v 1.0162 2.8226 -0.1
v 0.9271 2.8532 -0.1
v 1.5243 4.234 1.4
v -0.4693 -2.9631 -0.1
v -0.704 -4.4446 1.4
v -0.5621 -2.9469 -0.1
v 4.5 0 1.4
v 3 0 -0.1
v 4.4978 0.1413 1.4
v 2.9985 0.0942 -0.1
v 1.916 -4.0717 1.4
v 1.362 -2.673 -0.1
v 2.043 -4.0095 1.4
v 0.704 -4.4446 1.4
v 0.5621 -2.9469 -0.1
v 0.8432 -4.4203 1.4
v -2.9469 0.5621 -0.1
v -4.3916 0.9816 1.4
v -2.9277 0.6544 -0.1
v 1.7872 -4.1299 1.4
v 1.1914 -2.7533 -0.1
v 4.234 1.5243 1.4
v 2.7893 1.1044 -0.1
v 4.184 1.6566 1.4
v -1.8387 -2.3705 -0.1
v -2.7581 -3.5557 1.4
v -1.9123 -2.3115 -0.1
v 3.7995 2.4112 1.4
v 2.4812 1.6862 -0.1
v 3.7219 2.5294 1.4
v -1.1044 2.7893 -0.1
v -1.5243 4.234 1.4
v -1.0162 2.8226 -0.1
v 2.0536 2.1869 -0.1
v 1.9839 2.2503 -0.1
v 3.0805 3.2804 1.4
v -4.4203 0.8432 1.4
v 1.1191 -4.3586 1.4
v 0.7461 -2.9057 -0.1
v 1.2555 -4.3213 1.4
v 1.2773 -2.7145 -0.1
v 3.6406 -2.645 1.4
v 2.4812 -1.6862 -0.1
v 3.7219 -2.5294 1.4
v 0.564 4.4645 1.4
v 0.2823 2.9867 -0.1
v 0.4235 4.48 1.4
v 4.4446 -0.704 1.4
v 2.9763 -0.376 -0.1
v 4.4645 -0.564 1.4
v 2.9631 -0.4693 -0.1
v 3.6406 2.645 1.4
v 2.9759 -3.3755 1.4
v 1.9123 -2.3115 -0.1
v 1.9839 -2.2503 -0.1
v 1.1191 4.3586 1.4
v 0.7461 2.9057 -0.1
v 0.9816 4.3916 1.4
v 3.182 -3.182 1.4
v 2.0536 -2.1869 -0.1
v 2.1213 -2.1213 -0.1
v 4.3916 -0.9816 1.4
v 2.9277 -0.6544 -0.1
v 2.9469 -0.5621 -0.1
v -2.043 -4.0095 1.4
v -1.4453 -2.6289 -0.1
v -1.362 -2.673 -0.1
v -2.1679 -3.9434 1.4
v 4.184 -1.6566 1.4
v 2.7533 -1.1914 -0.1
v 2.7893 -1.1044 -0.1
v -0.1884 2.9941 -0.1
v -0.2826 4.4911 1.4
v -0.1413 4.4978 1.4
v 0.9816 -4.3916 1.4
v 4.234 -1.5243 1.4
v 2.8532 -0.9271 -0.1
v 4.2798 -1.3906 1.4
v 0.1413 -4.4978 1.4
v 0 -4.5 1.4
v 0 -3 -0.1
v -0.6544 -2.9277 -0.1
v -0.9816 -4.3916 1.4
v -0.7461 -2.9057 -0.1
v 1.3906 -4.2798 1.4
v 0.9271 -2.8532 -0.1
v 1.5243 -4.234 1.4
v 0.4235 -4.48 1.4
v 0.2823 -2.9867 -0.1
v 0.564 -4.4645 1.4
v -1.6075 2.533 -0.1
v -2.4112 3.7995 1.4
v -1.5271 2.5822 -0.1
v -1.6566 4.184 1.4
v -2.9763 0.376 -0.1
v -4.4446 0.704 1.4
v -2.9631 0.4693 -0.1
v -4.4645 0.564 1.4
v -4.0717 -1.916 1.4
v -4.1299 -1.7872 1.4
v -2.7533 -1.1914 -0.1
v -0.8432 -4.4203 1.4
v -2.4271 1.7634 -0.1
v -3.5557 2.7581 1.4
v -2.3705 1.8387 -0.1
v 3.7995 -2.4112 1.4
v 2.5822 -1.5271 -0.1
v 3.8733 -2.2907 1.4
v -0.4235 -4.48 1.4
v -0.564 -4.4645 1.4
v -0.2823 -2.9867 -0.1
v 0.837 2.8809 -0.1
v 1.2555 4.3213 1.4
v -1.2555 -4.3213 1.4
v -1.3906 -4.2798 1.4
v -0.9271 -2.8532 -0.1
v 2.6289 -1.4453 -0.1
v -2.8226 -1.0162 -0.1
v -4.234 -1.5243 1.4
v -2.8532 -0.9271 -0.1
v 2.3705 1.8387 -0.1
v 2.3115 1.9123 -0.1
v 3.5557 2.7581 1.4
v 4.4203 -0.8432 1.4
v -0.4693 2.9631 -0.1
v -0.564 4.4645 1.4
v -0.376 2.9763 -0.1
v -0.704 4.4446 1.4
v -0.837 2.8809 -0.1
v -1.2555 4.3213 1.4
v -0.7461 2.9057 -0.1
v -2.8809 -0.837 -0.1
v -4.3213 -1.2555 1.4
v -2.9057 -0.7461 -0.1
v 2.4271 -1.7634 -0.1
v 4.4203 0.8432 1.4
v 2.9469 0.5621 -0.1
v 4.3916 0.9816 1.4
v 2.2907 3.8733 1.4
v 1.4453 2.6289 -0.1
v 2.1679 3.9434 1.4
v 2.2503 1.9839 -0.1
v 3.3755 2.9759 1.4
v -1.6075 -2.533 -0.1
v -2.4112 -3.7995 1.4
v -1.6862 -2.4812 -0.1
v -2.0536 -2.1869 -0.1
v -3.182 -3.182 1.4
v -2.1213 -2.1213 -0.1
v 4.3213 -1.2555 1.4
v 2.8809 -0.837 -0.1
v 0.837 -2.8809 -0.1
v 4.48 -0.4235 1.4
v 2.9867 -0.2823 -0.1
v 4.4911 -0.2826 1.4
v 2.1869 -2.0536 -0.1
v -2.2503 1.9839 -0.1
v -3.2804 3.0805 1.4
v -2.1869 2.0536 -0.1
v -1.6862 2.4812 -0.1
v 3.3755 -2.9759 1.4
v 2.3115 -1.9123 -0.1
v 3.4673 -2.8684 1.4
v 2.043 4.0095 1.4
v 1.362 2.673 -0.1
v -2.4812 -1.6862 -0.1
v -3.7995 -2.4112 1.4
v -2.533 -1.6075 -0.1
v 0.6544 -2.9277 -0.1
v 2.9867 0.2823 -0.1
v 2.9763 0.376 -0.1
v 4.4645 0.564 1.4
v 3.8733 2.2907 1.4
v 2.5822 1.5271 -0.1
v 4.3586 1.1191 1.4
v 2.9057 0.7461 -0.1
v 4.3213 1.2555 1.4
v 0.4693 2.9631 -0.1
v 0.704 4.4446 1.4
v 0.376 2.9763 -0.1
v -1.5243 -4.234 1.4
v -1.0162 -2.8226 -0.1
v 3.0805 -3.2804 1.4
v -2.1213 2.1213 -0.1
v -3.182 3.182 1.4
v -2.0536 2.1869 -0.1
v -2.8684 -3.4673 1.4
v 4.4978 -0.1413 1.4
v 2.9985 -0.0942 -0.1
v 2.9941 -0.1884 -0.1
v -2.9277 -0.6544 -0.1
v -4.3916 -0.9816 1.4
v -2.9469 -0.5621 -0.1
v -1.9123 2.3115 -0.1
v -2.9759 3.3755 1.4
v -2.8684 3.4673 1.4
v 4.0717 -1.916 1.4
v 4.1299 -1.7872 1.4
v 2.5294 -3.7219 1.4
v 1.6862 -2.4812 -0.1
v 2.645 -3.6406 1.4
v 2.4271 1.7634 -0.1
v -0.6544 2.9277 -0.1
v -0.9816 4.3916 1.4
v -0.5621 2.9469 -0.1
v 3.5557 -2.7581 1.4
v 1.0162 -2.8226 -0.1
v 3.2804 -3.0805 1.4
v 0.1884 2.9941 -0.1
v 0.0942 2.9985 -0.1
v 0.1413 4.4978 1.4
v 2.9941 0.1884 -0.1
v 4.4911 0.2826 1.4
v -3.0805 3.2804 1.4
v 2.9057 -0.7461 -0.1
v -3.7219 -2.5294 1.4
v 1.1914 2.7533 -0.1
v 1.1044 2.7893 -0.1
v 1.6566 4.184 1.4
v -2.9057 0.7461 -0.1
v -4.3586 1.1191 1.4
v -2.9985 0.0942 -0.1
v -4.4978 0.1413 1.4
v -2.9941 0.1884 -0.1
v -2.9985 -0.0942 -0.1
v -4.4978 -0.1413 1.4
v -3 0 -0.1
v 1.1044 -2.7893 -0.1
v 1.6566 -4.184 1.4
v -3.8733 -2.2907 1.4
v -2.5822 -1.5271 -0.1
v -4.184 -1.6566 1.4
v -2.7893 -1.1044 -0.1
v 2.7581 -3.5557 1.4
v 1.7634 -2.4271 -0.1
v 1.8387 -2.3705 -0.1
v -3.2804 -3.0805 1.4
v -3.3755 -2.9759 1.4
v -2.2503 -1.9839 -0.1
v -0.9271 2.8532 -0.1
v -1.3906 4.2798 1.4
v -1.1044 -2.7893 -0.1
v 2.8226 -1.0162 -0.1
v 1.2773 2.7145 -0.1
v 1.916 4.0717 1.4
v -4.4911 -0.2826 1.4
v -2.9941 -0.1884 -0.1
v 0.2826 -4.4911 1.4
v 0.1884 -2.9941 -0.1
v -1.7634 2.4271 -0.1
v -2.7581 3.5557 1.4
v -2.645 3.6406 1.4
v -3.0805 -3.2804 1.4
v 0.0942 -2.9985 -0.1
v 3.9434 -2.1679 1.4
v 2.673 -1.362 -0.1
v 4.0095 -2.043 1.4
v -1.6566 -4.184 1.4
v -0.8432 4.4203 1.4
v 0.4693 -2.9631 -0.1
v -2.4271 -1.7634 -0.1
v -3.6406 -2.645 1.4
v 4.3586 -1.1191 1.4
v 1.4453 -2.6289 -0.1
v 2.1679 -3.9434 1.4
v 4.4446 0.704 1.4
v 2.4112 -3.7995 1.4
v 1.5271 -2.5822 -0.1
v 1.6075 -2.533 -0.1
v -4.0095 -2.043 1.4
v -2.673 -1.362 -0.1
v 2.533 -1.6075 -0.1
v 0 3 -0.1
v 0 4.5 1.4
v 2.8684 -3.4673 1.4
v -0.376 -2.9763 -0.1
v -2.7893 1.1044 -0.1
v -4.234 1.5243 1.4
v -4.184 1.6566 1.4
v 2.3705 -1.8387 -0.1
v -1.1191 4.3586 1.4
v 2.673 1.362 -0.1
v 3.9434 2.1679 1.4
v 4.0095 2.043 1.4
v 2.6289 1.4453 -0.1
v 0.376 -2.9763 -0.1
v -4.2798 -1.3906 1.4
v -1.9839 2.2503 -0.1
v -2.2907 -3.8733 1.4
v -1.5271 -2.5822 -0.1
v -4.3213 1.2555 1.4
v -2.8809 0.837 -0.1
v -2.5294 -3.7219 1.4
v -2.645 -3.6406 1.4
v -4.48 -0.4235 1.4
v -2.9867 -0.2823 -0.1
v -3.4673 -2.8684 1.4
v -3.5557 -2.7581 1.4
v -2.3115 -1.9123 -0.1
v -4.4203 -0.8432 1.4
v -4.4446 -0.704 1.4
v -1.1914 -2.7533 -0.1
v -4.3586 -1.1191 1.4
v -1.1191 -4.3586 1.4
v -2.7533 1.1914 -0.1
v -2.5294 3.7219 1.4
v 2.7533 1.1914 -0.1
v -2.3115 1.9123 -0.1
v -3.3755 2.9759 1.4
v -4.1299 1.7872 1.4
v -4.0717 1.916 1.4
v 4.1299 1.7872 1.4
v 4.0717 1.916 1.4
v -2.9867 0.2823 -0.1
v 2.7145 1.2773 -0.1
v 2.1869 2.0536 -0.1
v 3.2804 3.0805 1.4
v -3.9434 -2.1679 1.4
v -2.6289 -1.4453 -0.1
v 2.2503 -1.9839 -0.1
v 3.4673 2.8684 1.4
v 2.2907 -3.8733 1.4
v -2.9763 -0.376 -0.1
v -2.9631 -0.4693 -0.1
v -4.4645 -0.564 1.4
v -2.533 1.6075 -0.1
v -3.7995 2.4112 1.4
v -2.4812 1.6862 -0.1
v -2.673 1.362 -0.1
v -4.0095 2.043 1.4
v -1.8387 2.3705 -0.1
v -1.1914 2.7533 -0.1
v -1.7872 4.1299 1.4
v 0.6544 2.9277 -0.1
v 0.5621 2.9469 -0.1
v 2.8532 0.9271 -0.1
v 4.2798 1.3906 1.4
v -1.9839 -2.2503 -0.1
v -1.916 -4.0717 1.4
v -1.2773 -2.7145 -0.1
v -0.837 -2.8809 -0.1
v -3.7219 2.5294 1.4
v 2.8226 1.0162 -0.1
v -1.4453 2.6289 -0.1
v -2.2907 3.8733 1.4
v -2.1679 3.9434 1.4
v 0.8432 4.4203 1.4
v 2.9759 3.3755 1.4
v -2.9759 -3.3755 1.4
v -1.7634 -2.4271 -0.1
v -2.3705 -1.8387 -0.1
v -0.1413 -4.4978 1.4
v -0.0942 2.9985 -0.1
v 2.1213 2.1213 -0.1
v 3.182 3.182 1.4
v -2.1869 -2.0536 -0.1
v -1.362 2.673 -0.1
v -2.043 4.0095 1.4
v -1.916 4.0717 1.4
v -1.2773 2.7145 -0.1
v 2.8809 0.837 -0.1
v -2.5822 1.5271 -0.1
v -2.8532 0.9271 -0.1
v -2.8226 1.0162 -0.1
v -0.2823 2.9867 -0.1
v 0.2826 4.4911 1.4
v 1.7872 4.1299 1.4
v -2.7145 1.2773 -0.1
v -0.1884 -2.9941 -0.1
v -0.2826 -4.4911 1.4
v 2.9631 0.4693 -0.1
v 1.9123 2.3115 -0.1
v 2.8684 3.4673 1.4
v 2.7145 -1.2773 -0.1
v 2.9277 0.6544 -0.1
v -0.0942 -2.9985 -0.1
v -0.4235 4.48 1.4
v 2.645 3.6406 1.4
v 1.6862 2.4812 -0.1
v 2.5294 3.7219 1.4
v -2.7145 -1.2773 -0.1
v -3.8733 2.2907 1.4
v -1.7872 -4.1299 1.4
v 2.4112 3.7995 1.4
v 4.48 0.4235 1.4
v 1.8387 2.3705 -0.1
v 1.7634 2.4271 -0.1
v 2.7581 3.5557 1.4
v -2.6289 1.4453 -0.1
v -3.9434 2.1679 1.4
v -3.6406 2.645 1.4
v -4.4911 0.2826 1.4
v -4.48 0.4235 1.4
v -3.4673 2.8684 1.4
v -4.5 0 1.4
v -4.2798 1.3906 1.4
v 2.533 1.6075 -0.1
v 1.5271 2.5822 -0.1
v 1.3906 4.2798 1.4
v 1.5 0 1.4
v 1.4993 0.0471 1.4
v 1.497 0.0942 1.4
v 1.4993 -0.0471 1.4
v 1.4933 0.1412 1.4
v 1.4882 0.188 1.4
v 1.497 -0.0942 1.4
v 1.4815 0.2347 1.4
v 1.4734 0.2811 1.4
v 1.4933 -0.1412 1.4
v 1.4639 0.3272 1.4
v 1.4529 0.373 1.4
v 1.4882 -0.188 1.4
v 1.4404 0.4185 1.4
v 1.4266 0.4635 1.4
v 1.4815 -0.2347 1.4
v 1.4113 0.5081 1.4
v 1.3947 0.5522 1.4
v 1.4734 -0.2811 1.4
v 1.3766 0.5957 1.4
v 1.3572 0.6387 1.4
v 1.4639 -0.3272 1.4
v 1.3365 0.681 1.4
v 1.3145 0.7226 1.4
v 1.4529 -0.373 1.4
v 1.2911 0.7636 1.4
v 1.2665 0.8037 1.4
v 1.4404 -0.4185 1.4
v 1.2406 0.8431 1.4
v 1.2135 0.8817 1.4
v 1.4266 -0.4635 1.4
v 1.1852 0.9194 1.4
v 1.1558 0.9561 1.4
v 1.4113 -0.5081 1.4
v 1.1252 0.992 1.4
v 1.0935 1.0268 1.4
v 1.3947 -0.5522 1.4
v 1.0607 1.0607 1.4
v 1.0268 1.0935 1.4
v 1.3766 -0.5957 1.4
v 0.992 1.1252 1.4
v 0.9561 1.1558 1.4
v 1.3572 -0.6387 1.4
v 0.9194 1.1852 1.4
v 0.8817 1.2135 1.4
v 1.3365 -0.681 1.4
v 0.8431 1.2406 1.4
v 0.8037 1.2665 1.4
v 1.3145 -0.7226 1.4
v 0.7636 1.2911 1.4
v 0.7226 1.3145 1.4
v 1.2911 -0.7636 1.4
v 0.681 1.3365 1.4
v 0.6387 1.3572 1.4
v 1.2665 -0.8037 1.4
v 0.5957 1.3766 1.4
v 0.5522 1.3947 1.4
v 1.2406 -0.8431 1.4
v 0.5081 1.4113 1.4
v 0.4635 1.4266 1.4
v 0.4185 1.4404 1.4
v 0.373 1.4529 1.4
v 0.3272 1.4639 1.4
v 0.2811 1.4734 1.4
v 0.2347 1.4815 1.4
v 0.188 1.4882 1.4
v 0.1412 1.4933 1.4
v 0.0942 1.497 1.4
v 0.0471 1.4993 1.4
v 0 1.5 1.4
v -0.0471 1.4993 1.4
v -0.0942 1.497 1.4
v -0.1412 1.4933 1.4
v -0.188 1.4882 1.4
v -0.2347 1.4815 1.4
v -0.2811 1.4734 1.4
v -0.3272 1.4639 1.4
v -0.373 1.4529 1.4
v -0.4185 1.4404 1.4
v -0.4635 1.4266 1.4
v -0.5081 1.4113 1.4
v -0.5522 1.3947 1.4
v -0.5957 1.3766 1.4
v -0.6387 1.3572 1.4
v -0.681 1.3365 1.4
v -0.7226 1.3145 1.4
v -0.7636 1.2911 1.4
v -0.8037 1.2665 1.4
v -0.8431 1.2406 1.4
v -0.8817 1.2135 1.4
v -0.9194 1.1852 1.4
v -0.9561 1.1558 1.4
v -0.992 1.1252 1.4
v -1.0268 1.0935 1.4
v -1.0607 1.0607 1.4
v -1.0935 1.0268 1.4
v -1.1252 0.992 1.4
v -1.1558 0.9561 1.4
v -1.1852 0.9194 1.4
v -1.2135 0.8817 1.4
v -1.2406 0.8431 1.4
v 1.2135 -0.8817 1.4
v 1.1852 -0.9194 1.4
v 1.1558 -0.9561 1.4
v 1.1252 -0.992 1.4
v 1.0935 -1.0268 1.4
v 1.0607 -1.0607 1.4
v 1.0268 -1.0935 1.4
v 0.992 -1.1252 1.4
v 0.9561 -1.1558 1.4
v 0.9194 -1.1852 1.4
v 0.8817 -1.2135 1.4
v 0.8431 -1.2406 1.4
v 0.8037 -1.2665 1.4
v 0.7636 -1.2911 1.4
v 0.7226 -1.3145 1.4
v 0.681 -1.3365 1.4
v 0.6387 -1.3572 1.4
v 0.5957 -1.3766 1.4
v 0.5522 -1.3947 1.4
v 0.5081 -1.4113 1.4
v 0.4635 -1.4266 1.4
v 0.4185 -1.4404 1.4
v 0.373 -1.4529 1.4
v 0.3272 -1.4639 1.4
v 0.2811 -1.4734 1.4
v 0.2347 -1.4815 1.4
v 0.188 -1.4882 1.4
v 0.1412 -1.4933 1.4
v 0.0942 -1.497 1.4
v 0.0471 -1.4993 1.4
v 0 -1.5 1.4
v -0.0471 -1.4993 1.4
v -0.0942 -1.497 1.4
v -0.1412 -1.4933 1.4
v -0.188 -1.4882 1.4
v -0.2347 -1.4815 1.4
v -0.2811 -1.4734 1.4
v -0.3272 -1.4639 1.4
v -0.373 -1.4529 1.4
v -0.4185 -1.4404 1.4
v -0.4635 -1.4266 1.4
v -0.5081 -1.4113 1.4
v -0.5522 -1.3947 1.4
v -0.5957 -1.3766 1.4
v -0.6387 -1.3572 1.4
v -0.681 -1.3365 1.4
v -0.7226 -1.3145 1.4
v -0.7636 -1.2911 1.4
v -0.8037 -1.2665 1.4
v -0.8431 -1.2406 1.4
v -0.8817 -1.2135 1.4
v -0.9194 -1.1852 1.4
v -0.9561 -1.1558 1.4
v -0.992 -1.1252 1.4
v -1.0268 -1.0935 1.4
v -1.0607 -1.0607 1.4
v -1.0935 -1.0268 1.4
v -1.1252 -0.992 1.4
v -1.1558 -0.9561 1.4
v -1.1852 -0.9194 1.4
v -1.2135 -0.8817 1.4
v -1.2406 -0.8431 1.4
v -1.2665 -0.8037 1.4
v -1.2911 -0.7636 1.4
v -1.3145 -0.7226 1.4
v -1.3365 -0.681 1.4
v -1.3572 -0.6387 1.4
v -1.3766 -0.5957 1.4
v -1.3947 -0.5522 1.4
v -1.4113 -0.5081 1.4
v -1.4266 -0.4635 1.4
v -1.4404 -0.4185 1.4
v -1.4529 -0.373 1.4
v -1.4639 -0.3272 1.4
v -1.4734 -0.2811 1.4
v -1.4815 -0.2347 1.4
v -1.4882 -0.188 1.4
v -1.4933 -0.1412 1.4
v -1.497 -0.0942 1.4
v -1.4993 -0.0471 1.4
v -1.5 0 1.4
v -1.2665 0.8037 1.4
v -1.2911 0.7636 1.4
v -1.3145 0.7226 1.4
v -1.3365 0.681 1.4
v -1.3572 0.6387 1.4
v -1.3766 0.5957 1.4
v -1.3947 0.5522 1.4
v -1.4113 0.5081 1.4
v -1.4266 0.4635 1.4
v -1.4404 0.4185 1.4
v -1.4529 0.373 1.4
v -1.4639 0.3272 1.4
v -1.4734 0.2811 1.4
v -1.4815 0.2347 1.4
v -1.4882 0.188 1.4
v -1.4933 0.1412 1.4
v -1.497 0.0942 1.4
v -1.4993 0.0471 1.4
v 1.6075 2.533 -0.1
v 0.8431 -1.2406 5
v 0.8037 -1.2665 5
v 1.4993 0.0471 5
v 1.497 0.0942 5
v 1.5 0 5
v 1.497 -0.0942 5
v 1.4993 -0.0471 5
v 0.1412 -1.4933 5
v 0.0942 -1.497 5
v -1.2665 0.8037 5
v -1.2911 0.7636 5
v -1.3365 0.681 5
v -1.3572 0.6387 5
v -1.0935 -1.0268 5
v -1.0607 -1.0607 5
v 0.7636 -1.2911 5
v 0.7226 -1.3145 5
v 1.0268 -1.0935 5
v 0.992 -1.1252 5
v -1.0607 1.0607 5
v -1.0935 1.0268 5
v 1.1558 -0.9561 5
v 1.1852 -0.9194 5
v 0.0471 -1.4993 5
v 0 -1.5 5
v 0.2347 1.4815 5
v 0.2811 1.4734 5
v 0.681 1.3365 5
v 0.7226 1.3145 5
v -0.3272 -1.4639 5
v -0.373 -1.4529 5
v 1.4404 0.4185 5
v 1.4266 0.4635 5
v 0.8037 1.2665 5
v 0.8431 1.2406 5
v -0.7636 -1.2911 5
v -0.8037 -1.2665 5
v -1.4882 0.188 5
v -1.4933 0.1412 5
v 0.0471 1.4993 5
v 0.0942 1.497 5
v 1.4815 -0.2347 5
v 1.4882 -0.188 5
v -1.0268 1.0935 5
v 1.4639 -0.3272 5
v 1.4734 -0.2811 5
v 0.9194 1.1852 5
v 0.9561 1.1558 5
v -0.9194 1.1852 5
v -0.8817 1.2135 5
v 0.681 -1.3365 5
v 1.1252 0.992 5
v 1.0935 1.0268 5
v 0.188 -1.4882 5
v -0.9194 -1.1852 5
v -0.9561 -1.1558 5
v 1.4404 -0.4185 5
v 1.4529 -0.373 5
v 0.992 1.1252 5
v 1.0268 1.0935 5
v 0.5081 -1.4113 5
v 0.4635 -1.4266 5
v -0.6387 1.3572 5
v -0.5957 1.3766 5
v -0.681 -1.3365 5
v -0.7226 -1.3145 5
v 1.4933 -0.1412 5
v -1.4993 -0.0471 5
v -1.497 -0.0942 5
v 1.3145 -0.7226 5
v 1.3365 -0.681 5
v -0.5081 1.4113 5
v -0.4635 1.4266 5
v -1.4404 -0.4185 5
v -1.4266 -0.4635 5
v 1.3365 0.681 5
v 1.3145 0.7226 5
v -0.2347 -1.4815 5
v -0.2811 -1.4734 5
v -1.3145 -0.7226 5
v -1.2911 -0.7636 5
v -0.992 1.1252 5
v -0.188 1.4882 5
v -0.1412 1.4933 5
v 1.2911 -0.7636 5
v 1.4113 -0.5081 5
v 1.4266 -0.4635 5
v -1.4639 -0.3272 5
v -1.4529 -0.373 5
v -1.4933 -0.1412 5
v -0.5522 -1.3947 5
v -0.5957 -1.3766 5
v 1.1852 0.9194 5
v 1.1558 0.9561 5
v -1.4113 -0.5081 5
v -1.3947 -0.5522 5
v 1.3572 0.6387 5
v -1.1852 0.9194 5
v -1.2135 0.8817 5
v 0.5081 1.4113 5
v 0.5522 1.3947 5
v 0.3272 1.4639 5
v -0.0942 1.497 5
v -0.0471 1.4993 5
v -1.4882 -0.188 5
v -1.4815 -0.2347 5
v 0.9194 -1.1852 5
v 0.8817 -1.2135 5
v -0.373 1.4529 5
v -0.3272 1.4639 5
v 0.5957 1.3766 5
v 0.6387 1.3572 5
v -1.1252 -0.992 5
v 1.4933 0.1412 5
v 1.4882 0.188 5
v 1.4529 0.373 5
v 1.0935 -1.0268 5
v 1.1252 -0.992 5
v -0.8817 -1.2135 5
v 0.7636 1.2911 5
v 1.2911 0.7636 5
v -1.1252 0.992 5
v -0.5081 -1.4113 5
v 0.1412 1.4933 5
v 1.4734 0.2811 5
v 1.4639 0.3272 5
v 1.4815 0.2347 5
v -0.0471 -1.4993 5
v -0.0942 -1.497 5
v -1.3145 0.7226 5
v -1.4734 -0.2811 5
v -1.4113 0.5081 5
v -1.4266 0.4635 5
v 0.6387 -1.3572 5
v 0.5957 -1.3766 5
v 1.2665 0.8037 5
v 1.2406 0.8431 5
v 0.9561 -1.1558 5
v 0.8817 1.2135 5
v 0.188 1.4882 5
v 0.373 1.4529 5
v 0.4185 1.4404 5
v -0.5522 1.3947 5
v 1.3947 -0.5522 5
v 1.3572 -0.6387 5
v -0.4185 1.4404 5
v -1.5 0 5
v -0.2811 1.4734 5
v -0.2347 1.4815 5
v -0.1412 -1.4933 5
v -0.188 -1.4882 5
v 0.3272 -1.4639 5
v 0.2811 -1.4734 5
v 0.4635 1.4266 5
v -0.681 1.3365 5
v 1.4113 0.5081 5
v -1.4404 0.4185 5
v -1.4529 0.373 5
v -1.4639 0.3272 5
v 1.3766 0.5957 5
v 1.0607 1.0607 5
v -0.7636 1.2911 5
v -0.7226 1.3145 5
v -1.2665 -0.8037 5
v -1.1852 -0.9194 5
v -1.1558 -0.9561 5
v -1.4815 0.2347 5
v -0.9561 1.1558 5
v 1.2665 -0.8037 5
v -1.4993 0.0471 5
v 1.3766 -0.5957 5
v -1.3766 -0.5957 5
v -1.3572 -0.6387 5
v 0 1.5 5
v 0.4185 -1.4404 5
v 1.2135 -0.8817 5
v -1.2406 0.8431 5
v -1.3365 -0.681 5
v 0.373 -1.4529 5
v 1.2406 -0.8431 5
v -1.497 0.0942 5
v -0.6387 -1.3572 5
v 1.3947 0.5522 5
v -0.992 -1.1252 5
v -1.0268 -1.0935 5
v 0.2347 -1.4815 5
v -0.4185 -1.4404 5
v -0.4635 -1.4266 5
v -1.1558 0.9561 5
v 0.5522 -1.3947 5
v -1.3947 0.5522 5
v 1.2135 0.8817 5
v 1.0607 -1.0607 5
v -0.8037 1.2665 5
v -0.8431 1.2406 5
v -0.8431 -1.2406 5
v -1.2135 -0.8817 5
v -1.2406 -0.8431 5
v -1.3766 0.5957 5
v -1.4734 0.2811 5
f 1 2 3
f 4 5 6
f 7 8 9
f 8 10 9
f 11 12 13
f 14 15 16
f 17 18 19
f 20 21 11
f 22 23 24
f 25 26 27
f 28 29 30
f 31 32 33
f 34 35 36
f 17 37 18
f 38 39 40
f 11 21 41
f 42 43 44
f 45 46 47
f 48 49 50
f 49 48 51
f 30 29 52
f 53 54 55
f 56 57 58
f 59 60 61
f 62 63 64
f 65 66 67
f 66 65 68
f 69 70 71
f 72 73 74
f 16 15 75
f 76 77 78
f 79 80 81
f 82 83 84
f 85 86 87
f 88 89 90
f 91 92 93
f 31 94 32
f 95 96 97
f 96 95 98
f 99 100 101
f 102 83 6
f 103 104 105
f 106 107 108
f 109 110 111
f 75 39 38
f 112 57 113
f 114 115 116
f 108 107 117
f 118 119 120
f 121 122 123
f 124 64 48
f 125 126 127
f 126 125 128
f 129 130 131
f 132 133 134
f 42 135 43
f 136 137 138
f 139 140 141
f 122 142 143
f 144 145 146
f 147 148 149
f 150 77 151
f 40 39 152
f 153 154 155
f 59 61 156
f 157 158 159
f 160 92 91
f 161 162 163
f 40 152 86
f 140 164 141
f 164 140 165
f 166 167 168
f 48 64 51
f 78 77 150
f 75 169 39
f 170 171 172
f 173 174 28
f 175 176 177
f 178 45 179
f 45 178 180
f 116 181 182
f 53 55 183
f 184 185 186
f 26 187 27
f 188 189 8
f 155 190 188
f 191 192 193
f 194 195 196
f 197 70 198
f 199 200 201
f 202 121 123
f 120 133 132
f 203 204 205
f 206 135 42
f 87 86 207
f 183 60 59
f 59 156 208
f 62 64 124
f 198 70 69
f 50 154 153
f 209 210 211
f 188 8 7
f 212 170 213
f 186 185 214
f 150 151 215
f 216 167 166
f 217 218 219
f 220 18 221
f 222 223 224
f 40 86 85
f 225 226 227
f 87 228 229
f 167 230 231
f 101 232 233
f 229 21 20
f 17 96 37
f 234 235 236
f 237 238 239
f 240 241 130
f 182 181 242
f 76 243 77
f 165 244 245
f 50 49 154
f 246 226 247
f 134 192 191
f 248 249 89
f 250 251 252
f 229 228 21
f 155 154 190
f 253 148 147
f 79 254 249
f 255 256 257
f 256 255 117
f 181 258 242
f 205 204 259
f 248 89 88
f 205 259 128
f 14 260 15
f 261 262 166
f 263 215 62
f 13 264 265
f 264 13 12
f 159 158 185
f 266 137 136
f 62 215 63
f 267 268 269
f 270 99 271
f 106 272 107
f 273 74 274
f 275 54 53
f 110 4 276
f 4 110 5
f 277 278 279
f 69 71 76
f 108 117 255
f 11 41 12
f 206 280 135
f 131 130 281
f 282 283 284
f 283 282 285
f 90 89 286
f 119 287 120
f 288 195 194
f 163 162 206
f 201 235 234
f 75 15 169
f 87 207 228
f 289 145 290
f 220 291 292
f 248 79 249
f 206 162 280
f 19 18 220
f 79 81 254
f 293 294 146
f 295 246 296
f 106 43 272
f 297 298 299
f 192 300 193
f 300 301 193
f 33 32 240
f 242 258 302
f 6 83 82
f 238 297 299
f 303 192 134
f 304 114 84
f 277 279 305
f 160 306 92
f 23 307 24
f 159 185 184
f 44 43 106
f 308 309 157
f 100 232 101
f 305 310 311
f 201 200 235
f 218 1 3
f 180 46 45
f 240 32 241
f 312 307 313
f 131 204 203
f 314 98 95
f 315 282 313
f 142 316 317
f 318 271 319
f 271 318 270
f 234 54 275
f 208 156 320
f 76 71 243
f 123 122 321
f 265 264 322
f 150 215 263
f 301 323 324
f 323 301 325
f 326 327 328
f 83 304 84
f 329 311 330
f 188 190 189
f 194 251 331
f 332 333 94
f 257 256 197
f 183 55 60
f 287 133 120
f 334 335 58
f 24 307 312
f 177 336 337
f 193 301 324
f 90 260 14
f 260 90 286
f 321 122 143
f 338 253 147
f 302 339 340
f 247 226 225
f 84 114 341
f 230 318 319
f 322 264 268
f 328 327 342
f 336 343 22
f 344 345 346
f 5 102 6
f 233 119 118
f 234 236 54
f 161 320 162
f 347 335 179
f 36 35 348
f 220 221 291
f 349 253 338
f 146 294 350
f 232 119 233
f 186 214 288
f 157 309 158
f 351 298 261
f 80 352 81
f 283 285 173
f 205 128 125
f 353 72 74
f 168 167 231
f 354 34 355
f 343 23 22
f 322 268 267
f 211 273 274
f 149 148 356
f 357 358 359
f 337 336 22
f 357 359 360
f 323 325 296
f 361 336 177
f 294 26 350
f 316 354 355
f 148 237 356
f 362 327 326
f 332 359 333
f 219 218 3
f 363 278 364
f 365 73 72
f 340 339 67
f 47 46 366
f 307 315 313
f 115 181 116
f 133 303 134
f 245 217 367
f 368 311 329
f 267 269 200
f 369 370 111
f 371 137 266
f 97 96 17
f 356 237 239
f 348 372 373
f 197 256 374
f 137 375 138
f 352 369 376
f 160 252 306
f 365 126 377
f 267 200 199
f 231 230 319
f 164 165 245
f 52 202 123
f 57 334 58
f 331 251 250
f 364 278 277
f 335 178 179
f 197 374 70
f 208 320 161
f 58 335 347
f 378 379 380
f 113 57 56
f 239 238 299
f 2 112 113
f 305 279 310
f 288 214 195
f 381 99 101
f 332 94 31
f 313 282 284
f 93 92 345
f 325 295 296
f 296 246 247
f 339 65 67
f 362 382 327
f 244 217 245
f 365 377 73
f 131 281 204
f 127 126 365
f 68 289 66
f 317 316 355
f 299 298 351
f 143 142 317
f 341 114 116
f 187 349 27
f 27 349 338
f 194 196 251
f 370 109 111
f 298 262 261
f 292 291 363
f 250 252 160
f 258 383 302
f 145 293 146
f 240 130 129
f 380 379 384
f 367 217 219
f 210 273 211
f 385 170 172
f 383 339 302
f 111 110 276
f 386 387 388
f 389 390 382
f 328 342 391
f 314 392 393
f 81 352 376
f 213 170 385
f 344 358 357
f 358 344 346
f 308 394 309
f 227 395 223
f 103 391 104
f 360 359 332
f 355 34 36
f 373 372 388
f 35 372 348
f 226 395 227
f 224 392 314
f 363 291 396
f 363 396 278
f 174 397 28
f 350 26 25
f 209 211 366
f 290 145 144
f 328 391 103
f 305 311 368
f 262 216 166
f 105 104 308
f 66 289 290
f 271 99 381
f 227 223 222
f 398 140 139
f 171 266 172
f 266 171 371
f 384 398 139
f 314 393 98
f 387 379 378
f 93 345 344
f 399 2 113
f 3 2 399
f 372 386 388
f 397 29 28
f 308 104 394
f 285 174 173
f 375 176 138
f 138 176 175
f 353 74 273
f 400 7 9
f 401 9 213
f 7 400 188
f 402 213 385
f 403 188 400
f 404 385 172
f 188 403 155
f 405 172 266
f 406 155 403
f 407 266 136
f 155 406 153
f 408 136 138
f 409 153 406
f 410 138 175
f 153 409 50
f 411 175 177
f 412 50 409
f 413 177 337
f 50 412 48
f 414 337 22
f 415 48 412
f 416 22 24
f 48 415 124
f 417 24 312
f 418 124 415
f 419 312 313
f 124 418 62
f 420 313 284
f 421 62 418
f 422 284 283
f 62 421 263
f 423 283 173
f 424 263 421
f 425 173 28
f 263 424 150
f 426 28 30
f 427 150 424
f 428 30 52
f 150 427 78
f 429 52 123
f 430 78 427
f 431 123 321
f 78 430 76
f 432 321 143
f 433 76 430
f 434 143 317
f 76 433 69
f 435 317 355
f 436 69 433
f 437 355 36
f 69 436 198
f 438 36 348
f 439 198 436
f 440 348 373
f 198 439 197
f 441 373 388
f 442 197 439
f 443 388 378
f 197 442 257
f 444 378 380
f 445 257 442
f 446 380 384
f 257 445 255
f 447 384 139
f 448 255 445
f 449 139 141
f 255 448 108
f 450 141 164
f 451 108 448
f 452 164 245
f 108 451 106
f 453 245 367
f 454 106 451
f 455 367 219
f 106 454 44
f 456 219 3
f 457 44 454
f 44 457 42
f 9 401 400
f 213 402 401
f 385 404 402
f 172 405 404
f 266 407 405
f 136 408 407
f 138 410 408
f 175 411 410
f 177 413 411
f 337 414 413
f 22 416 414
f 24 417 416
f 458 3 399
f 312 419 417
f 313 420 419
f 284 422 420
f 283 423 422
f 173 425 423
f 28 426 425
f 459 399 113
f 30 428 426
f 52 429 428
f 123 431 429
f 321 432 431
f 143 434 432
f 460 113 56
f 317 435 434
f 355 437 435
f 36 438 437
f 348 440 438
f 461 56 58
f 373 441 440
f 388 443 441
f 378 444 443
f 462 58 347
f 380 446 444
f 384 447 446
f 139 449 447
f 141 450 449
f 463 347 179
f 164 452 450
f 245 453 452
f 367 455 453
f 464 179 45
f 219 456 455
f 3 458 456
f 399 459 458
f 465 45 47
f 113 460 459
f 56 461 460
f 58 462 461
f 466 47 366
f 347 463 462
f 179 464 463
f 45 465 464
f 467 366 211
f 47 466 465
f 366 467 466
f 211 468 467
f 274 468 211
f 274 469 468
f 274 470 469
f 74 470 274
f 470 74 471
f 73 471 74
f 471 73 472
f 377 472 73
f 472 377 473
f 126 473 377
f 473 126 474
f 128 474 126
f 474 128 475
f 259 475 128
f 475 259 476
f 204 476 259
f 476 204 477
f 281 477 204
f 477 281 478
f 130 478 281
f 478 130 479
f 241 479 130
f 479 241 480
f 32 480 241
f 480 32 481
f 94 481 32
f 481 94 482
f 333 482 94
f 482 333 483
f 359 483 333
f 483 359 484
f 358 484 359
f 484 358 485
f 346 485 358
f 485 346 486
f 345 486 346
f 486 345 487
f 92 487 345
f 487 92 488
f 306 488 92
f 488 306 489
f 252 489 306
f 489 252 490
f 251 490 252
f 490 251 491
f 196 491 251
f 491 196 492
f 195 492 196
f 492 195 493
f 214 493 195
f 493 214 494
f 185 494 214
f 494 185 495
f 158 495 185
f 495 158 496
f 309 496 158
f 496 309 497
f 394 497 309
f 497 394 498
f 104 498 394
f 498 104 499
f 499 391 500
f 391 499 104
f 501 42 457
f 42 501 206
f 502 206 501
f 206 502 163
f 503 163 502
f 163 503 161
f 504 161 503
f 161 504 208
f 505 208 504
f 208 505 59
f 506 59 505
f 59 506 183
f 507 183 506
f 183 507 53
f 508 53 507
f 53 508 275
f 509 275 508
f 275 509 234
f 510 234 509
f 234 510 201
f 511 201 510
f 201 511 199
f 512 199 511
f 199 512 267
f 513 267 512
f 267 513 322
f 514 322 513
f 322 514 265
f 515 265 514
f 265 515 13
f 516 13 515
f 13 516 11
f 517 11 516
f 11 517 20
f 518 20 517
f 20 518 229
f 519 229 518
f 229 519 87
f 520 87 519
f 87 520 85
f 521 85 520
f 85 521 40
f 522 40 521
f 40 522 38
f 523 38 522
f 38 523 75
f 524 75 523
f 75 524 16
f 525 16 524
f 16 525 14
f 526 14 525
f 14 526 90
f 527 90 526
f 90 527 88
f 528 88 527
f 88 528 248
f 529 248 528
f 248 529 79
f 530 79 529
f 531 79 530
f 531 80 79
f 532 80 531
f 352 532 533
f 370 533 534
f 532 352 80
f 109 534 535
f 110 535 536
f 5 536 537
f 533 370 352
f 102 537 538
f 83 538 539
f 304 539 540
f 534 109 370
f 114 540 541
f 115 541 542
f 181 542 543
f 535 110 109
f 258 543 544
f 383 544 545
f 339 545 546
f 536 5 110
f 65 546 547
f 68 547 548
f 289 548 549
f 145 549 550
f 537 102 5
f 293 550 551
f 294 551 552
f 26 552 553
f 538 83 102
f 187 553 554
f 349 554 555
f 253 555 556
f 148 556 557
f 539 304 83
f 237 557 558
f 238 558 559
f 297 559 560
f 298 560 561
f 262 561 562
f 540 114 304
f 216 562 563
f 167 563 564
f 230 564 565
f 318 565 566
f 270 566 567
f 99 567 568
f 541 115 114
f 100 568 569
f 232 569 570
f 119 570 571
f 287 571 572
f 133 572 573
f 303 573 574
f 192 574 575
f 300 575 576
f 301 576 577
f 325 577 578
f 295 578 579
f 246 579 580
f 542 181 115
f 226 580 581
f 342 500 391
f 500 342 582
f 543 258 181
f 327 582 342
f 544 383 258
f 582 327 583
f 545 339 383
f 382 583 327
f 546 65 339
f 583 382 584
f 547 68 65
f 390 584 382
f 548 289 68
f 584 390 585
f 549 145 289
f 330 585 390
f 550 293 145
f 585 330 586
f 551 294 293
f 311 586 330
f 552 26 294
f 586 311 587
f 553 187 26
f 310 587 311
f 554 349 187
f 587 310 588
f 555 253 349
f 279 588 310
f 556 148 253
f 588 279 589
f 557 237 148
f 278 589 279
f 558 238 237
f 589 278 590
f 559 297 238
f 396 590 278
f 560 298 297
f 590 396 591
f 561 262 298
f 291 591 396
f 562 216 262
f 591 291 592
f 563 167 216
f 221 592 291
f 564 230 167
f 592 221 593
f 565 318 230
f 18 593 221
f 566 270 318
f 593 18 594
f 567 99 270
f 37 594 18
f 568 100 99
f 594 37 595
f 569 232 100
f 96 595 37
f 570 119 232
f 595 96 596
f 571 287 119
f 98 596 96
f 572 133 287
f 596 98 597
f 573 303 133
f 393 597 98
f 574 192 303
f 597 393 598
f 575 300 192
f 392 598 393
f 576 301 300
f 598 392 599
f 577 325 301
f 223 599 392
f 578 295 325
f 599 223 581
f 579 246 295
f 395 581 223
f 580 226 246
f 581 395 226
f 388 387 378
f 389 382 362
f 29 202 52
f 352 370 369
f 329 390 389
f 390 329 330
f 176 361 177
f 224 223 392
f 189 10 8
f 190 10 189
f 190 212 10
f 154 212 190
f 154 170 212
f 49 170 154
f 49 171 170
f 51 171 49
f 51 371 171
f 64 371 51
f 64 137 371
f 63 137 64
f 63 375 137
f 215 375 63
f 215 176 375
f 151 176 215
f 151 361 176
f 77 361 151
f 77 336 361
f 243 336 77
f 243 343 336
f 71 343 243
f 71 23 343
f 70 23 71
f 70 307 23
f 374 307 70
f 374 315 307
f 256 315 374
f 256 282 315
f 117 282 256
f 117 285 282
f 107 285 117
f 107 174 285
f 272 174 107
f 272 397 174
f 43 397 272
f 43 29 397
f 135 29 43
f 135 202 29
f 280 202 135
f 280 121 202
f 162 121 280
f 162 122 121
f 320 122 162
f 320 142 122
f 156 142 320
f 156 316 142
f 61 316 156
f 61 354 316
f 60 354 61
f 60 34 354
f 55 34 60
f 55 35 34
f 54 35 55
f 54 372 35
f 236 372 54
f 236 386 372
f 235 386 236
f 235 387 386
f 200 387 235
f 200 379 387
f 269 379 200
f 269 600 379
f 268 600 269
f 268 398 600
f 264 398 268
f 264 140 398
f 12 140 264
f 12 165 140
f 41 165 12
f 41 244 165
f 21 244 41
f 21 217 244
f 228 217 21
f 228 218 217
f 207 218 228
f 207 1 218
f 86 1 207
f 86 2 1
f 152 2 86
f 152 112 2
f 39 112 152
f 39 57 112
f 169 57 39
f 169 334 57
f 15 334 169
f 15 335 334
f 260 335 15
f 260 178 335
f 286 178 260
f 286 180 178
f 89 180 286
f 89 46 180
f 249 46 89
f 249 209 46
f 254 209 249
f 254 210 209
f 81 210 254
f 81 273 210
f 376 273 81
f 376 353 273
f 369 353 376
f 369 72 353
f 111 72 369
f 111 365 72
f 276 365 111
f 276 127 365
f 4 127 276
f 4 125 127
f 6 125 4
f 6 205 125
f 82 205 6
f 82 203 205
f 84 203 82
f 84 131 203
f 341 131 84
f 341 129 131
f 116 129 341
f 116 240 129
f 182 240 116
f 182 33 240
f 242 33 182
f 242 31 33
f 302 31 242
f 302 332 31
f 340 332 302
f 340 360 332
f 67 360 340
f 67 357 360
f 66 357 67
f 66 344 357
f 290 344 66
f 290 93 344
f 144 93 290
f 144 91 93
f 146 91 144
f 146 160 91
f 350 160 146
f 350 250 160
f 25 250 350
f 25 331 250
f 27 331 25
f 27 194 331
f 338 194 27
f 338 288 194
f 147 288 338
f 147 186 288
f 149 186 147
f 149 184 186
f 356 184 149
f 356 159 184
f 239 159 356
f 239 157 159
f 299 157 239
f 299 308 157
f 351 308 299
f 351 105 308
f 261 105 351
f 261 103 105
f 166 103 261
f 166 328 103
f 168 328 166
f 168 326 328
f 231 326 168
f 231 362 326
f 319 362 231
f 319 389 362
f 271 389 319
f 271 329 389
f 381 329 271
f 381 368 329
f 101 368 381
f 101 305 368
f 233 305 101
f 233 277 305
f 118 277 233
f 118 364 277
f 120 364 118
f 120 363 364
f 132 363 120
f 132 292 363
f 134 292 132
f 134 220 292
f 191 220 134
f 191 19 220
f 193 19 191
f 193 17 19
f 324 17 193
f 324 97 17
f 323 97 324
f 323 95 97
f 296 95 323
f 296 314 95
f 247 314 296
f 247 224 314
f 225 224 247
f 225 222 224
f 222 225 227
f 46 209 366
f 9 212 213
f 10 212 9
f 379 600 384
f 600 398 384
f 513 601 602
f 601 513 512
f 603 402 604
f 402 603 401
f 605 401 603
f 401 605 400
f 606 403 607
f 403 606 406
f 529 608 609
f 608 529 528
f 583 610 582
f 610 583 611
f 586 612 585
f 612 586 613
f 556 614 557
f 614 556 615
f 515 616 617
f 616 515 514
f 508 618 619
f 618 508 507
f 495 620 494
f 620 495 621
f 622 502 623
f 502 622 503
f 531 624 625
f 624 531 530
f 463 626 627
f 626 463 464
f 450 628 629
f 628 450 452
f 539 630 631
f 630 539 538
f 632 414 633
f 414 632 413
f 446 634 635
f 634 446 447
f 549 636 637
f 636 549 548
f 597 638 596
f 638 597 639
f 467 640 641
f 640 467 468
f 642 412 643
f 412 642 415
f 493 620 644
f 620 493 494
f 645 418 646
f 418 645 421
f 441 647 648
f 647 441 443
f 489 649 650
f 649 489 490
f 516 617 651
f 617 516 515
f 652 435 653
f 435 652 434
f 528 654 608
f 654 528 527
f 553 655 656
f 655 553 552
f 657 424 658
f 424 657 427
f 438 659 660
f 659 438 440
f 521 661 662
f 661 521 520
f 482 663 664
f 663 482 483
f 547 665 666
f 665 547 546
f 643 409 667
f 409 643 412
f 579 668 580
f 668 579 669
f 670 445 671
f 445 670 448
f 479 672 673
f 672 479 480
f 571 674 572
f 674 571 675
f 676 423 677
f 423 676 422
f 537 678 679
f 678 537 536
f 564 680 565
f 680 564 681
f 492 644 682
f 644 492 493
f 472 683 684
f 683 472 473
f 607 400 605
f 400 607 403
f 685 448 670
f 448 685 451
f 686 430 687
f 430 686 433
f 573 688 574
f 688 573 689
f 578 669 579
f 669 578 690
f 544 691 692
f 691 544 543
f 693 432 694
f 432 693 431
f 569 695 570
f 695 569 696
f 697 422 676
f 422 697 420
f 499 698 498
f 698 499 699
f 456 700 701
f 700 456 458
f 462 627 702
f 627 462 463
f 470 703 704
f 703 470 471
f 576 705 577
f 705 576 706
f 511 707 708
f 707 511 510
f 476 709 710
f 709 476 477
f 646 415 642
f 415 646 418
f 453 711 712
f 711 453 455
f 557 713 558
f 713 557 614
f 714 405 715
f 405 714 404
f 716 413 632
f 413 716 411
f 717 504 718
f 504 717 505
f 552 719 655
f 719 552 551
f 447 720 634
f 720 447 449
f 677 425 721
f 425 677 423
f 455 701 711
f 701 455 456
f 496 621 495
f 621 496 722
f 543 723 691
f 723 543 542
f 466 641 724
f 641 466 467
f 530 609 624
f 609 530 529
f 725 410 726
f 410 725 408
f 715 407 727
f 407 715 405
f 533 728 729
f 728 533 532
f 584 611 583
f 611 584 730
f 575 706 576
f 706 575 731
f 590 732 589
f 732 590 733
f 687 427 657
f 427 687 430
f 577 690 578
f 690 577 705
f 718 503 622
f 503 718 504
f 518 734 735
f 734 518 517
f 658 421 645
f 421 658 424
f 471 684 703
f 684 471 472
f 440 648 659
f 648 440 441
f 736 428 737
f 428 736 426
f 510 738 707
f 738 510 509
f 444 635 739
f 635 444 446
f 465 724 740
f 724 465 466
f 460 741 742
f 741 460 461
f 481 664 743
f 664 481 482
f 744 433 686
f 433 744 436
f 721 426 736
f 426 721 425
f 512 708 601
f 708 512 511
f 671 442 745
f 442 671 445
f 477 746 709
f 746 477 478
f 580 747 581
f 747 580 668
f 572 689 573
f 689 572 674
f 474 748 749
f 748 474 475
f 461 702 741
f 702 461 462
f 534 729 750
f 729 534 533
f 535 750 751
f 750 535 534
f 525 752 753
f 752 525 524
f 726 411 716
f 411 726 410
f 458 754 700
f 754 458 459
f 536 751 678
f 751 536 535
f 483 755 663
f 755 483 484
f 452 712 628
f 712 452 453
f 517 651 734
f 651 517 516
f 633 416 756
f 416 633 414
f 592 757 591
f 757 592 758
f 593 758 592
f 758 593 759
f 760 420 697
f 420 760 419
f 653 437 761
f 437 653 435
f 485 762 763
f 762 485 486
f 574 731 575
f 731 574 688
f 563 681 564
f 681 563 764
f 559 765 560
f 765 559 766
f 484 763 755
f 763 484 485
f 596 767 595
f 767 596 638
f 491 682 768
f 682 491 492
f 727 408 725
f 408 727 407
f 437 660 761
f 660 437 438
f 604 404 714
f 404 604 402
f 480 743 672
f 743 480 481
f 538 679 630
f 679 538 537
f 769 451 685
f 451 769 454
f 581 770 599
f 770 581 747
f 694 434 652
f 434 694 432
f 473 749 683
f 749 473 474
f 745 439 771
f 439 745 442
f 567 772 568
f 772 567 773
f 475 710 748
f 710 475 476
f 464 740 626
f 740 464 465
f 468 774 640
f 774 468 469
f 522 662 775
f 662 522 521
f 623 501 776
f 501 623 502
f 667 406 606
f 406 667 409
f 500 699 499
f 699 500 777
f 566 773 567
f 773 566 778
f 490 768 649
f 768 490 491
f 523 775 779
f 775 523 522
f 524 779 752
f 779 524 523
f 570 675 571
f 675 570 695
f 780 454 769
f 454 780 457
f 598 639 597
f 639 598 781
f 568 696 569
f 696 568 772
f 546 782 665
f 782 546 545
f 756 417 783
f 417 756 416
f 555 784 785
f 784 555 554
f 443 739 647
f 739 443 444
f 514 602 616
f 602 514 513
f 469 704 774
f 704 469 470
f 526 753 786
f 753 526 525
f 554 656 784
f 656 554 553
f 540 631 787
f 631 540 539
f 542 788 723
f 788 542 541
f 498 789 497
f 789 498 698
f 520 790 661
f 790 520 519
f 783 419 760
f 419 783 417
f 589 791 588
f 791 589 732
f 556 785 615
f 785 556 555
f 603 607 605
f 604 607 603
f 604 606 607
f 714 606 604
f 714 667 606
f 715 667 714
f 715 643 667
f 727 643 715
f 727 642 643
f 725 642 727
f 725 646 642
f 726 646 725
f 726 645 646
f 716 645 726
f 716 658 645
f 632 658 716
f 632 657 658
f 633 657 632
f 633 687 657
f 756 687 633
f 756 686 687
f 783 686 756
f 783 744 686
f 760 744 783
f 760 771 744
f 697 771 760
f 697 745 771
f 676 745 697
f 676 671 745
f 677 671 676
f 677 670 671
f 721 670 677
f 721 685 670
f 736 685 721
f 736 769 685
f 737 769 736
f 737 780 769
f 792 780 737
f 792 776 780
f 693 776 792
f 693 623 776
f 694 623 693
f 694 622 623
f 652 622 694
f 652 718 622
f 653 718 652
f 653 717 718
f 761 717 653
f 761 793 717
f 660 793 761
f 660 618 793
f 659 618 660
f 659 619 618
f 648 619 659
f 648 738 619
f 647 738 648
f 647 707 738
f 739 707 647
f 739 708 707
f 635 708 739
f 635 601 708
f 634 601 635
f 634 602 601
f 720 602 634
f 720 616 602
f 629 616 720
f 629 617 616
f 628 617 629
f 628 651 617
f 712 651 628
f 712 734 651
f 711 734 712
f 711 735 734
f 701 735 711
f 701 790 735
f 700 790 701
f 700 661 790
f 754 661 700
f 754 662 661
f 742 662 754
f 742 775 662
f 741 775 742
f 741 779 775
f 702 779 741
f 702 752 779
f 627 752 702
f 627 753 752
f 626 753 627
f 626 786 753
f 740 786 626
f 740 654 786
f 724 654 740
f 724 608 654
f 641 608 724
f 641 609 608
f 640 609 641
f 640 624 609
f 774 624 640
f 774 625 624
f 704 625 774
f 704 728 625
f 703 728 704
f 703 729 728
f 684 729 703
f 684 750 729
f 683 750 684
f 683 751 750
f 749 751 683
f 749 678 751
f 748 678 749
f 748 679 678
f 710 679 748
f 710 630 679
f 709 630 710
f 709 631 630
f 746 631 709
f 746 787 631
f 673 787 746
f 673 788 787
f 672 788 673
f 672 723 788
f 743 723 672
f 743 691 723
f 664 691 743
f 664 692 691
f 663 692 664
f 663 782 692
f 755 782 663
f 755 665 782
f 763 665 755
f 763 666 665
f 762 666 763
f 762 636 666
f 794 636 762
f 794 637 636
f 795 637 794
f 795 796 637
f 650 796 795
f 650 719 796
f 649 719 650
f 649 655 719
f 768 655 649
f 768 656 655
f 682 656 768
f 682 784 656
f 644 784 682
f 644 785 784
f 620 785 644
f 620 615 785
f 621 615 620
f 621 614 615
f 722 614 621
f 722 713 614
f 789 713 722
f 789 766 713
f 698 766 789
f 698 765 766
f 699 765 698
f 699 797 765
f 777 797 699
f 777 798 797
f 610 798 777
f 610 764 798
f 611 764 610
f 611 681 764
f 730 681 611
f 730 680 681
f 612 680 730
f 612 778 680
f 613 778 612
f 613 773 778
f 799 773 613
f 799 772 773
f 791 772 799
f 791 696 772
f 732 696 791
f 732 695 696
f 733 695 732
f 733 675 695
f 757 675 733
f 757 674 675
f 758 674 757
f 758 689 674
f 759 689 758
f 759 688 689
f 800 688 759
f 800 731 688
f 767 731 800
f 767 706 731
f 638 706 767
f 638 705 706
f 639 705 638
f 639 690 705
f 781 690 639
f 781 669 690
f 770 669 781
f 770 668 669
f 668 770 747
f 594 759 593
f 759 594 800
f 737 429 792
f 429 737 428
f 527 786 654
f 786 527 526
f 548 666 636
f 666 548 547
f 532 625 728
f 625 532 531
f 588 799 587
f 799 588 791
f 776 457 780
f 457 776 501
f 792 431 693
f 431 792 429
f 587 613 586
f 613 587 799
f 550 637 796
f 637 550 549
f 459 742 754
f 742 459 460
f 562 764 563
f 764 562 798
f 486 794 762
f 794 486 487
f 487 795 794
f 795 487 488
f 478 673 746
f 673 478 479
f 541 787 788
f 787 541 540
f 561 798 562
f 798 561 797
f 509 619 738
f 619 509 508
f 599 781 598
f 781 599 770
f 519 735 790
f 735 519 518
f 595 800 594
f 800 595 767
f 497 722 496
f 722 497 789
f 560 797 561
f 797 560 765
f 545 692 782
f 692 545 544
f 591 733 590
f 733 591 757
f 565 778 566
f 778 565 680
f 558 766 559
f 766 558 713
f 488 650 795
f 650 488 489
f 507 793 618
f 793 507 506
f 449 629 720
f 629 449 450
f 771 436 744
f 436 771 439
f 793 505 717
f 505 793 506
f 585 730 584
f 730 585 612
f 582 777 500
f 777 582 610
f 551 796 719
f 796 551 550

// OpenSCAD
$fn=200;

sp2();

module sp1(){
    h=3;
    difference(){
        cylinder(d=10, h=h);
        
        translate([0,0,-.1])
        cylinder(d1=3.1, d2=6.5, h=h+.2);
    }
}


module sp2(){
    h=1.5;
    hp=5;
    
    translate([0,0,-.1])
    cylinder(d1=6, d2=9, h=h);

    cylinder(d=3, h=hp);    
}
